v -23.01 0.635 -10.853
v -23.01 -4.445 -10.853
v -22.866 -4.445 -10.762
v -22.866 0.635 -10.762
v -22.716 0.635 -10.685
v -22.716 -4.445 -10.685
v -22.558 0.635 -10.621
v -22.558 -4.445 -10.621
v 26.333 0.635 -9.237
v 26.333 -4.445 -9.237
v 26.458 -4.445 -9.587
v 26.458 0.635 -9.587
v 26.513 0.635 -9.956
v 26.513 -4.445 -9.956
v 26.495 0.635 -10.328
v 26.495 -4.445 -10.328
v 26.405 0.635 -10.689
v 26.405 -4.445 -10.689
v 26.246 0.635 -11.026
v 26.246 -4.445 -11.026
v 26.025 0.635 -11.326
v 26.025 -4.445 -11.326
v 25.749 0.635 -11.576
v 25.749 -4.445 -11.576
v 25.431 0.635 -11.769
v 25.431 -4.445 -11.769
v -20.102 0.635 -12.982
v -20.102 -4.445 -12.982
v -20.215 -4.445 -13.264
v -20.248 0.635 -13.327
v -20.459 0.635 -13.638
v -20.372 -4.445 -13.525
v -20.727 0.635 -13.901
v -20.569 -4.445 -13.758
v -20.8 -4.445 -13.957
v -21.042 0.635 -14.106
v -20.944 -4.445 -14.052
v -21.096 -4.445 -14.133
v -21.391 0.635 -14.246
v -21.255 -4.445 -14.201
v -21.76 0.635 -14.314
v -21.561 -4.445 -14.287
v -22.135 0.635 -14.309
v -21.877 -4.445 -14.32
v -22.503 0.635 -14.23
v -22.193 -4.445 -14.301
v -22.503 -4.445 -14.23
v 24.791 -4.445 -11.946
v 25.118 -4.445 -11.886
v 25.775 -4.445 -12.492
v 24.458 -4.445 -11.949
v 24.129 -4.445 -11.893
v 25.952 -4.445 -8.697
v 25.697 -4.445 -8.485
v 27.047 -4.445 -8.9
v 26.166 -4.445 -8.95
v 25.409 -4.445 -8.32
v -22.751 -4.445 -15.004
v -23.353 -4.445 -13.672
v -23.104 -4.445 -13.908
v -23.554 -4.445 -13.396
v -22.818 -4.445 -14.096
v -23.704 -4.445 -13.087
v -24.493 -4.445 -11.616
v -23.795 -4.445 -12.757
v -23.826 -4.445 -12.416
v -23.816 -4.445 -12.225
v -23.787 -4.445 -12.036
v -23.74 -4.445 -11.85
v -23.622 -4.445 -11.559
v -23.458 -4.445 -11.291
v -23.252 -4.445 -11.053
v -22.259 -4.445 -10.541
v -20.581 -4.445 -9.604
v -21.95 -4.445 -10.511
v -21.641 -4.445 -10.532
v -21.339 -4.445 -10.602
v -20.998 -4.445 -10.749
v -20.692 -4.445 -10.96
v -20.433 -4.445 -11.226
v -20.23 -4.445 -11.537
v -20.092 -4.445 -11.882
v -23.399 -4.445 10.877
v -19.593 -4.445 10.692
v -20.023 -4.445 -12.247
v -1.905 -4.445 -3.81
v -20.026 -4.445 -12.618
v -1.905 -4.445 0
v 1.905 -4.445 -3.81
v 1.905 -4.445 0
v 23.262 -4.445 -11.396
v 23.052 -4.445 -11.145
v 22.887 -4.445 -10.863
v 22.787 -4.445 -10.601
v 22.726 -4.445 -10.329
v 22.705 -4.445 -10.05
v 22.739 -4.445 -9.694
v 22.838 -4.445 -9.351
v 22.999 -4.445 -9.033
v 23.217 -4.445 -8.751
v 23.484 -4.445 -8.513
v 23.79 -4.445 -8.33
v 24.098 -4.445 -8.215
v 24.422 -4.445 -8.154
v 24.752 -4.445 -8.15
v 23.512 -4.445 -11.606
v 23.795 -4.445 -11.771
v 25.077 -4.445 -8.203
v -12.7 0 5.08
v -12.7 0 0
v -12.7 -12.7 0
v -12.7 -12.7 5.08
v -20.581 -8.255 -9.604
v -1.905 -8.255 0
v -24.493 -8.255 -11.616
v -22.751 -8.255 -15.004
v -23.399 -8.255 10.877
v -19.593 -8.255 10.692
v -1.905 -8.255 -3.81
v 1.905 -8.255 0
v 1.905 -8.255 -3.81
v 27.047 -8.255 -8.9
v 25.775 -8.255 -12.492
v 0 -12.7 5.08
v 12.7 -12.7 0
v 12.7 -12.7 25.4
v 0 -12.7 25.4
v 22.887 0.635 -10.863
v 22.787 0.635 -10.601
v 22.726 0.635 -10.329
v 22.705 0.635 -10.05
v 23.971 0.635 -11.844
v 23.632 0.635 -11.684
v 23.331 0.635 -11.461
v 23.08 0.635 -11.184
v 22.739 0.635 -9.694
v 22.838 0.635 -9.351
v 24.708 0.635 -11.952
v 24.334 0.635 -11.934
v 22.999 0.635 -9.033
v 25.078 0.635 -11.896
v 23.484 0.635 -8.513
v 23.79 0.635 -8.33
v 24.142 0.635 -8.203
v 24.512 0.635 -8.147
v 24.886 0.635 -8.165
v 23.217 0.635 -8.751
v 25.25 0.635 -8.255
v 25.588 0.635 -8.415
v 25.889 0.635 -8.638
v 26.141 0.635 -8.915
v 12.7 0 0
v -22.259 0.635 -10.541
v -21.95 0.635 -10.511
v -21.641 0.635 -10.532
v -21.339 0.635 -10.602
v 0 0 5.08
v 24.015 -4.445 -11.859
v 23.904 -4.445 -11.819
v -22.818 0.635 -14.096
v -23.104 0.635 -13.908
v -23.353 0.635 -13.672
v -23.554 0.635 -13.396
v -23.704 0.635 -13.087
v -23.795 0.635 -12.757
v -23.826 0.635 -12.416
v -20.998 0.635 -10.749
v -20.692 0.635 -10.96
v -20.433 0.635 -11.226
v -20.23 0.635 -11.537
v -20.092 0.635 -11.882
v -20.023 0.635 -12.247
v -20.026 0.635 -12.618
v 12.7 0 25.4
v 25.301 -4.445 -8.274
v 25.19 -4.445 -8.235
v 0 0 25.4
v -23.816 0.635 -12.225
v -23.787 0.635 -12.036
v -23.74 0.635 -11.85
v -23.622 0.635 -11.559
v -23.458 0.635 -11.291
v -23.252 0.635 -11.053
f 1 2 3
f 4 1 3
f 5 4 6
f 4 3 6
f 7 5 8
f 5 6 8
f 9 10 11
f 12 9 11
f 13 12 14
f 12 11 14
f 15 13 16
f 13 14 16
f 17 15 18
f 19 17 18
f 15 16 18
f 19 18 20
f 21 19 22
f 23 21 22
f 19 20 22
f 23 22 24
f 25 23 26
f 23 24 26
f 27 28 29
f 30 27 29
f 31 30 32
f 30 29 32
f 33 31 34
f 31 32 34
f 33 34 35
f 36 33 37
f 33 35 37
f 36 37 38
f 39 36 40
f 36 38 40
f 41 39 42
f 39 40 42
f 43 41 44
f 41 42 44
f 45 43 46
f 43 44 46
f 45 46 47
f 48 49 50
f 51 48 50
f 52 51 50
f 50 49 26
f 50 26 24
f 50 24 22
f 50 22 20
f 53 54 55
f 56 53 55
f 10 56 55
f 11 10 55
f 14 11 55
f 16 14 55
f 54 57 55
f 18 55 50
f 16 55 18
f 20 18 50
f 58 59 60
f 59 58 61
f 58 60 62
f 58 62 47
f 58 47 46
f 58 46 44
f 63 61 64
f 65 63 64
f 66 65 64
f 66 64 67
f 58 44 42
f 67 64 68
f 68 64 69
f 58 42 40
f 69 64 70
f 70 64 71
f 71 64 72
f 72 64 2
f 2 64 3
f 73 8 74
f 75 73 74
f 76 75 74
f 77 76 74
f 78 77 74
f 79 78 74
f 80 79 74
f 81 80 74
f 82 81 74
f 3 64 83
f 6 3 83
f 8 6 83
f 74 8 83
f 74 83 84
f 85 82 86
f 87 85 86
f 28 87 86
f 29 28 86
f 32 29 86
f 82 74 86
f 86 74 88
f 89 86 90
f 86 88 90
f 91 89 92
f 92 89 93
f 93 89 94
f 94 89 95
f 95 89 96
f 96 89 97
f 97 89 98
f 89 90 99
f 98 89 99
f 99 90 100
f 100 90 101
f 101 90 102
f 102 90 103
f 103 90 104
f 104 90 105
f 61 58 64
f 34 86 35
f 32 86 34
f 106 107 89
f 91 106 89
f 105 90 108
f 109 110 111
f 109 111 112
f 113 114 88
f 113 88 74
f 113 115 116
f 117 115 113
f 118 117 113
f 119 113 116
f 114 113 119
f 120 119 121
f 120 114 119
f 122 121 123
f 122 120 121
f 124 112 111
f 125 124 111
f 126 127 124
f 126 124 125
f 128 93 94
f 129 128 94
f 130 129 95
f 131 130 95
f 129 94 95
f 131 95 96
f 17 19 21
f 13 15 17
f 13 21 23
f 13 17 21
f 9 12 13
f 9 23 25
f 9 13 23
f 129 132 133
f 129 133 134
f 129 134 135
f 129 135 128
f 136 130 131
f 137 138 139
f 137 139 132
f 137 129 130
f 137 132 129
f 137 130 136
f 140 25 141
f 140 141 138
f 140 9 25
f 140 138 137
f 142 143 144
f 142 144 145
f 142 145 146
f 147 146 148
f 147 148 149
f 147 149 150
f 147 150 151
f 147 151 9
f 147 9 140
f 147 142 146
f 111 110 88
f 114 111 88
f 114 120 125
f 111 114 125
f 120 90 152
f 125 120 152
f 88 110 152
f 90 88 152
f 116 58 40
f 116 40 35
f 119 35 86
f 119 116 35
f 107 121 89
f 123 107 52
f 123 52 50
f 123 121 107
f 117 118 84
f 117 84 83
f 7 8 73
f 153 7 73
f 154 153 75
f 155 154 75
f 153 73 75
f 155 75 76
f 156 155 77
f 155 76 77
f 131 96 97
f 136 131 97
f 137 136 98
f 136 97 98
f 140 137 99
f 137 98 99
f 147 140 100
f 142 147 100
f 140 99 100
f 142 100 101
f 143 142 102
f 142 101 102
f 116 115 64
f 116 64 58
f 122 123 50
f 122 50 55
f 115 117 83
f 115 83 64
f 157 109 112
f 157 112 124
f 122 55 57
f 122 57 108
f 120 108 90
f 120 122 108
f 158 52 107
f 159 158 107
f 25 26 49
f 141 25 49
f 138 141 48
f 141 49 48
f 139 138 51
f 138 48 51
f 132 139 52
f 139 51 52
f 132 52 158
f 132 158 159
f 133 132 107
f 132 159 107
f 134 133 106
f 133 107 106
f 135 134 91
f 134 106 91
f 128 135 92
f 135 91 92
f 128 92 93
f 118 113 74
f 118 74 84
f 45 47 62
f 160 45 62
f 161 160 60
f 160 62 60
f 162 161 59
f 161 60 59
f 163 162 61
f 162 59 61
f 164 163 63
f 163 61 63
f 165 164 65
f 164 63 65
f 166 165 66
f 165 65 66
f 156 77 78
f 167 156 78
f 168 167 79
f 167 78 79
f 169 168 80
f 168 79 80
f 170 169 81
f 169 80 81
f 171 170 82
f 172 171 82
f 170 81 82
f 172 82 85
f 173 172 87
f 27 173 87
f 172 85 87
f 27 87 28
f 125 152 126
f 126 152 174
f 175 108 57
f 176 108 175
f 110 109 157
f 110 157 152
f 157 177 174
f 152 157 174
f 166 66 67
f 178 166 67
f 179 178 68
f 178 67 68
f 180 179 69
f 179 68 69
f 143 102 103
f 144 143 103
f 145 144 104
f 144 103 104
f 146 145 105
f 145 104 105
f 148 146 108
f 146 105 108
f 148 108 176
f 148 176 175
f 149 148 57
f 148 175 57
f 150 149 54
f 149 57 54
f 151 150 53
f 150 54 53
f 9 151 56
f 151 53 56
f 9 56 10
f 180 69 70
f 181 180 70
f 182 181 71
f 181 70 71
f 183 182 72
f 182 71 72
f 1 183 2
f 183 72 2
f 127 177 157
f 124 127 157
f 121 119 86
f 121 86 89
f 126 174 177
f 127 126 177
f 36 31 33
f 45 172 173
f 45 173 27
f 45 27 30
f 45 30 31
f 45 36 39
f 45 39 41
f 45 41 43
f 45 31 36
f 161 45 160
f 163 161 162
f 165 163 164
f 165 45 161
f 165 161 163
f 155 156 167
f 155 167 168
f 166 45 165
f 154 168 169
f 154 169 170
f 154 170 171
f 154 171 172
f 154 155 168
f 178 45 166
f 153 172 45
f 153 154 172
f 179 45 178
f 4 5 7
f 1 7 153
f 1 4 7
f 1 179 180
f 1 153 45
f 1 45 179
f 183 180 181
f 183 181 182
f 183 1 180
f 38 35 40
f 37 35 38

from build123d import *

# Parameters (mm, degrees)
F0_W     = 12.7
F0_H     = 5.08
F1_DEPTH = 12.7
F3_DEPTH = 3.81
F5_DEPTH = 3.81
F7_DEPTH = 3.81
F9_DEPTH = 5.08


with BuildPart() as f1:
    # F0 (on Front) → F1 (new body)
    with BuildSketch(Plane.XZ):
        with Locations((-6.35, 2.54)):
            Rectangle(F0_W, F0_H)
        Polygon((0, 5.08), (0, 0), (12.7, 0), (12.7, 25.4), (0, 25.4), align=None)
    extrude(amount=F1_DEPTH)

    # F2 (on face) → F3 (join)
    with BuildSketch(Plane(origin=(0, 0, 0), x_dir=(1, 0, 0), z_dir=(0, 0, -1))):
        Polygon((-1.905, 8.255), (-1.905, 7.3025), (0, 6.35), (1.905, 7.3025), (1.905, 8.255), align=None)
        Polygon((0, 6.35), (-1.905, 7.3025), (-1.905, 5.3975), align=None)
        Polygon((1.905, 7.3025), (0, 6.35), (1.905, 5.3975), align=None)
        Polygon((1.905, 5.3975), (0, 6.35), (-1.905, 5.3975), (-1.905, 4.445), (1.905, 4.445), align=None)
    extrude(amount=F3_DEPTH)

    # F4 (on face) → F5 (join)
    with BuildSketch(Plane.XZ.offset(8.255)):
        Polygon((1.905, 0), (-1.905, 0), (-24.493341372, -11.6158010512), (-22.7509712143, -15.004052257), (-1.905, -3.81), (1.905, -3.81), (25.7752793361, -12.4915761481), (27.0466815017, -8.8999697479), align=None)
    extrude(amount=-F5_DEPTH)

    # F6 (on face) → F7 (join)
    with BuildSketch(Plane.XZ.offset(8.255)):
        Polygon((-23.3987490657, 10.877285878), (-24.493341372, -11.6158010512), (-20.5809258805, -9.6038852921), (-19.5932523682, 10.6920970944), align=None)
    extrude(amount=-F7_DEPTH)

    # F8 (on face) → F9 (join)
    with BuildSketch(Plane(origin=(0, -4.445, 0), x_dir=(-1, 0, 0), z_dir=(0, 1, 0))):
        with BuildLine():
            ThreePointArc((-22.7051897472, -10.0496184245), (-22.9990213636, -9.0331729319), (-23.7898736732, -8.3302852576))
            Line((-23.7898736732, -8.3302852576), (-24.6101897472, -10.0496184245))
            Line((-24.6101897472, -10.0496184245), (-22.8873458267, -10.8625352872))
            ThreePointArc((-22.8873458267, -10.8625352872), (-22.7512864861, -10.4661561368), (-22.7051897472, -10.0496184245))
        make_face()
        with BuildLine():
            Line((-24.6101897472, -10.0496184245), (-23.7898736732, -8.3302852576))
            ThreePointArc((-23.7898736732, -8.3302852576), (-25.2497495627, -8.2551858561), (-26.3330336677, -9.2367015618))
            Line((-26.3330336677, -9.2367015618), (-24.6101897472, -10.0496184245))
        make_face()
        with BuildLine():
            Line((-22.8873458267, -10.8625352872), (-24.6101897472, -10.0496184245))
            Line((-24.6101897472, -10.0496184245), (-25.4305058212, -11.7689515914))
            ThreePointArc((-25.4305058212, -11.7689515914), (-23.9706299318, -11.8440509929), (-22.8873458267, -10.8625352872))
        make_face()
        with BuildLine():
            Line((-25.4305058212, -11.7689515914), (-24.6101897472, -10.0496184245))
            Line((-24.6101897472, -10.0496184245), (-26.3330336677, -9.2367015618))
            ThreePointArc((-26.3330336677, -9.2367015618), (-26.4046223156, -10.68917824), (-25.4305058212, -11.7689515914))
        make_face()
        with BuildLine():
            ThreePointArc((22.5584327346, -10.6207959991), (21.9501618456, -10.5111051642), (21.338789094, -10.6019286869))
            Line((21.338789094, -10.6019286869), (21.9206959191, -12.4158772658))
            Line((21.9206959191, -12.4158772658), (23.7397587132, -11.8501604187))
            ThreePointArc((23.7397587132, -11.8501604187), (23.4578969896, -11.2906937835), (23.009799723, -10.8529064074))
            Line((23.009799723, -10.8529064074), (22.5584327346, -10.6207959991))
        make_face()
        with BuildLine():
            Line((21.9206959191, -12.4158772658), (21.338789094, -10.6019286869))
            ThreePointArc((21.338789094, -10.6019286869), (20.2304694068, -11.537151292), (20.101633125, -12.9815941129))
            Line((20.101633125, -12.9815941129), (21.9206959191, -12.4158772658))
        make_face()
        with BuildLine():
            Line((23.7397587132, -11.8501604187), (21.9206959191, -12.4158772658))
            Line((21.9206959191, -12.4158772658), (22.5026027442, -14.2298258447))
            ThreePointArc((22.5026027442, -14.2298258447), (23.4597796566, -13.5384841646), (23.8256959191, -12.4158772658))
            ThreePointArc((23.8256959191, -12.4158772658), (23.8040890834, -12.1297738079), (23.7397587132, -11.8501604187))
        make_face()
        with BuildLine():
            Line((22.5026027442, -14.2298258447), (21.9206959191, -12.4158772658))
            Line((21.9206959191, -12.4158772658), (20.101633125, -12.9815941129))
            ThreePointArc((20.101633125, -12.9815941129), (21.0419699453, -14.1061037782), (22.5026027442, -14.2298258447))
        make_face()
        with BuildLine():
            ThreePointArc((23.009799723, -10.8529064074), (22.7918809979, -10.7217516629), (22.5584327346, -10.6207959991))
            Line((22.5584327346, -10.6207959991), (23.009799723, -10.8529064074))
        make_face()
    extrude(amount=F9_DEPTH)


solid = f1.part
